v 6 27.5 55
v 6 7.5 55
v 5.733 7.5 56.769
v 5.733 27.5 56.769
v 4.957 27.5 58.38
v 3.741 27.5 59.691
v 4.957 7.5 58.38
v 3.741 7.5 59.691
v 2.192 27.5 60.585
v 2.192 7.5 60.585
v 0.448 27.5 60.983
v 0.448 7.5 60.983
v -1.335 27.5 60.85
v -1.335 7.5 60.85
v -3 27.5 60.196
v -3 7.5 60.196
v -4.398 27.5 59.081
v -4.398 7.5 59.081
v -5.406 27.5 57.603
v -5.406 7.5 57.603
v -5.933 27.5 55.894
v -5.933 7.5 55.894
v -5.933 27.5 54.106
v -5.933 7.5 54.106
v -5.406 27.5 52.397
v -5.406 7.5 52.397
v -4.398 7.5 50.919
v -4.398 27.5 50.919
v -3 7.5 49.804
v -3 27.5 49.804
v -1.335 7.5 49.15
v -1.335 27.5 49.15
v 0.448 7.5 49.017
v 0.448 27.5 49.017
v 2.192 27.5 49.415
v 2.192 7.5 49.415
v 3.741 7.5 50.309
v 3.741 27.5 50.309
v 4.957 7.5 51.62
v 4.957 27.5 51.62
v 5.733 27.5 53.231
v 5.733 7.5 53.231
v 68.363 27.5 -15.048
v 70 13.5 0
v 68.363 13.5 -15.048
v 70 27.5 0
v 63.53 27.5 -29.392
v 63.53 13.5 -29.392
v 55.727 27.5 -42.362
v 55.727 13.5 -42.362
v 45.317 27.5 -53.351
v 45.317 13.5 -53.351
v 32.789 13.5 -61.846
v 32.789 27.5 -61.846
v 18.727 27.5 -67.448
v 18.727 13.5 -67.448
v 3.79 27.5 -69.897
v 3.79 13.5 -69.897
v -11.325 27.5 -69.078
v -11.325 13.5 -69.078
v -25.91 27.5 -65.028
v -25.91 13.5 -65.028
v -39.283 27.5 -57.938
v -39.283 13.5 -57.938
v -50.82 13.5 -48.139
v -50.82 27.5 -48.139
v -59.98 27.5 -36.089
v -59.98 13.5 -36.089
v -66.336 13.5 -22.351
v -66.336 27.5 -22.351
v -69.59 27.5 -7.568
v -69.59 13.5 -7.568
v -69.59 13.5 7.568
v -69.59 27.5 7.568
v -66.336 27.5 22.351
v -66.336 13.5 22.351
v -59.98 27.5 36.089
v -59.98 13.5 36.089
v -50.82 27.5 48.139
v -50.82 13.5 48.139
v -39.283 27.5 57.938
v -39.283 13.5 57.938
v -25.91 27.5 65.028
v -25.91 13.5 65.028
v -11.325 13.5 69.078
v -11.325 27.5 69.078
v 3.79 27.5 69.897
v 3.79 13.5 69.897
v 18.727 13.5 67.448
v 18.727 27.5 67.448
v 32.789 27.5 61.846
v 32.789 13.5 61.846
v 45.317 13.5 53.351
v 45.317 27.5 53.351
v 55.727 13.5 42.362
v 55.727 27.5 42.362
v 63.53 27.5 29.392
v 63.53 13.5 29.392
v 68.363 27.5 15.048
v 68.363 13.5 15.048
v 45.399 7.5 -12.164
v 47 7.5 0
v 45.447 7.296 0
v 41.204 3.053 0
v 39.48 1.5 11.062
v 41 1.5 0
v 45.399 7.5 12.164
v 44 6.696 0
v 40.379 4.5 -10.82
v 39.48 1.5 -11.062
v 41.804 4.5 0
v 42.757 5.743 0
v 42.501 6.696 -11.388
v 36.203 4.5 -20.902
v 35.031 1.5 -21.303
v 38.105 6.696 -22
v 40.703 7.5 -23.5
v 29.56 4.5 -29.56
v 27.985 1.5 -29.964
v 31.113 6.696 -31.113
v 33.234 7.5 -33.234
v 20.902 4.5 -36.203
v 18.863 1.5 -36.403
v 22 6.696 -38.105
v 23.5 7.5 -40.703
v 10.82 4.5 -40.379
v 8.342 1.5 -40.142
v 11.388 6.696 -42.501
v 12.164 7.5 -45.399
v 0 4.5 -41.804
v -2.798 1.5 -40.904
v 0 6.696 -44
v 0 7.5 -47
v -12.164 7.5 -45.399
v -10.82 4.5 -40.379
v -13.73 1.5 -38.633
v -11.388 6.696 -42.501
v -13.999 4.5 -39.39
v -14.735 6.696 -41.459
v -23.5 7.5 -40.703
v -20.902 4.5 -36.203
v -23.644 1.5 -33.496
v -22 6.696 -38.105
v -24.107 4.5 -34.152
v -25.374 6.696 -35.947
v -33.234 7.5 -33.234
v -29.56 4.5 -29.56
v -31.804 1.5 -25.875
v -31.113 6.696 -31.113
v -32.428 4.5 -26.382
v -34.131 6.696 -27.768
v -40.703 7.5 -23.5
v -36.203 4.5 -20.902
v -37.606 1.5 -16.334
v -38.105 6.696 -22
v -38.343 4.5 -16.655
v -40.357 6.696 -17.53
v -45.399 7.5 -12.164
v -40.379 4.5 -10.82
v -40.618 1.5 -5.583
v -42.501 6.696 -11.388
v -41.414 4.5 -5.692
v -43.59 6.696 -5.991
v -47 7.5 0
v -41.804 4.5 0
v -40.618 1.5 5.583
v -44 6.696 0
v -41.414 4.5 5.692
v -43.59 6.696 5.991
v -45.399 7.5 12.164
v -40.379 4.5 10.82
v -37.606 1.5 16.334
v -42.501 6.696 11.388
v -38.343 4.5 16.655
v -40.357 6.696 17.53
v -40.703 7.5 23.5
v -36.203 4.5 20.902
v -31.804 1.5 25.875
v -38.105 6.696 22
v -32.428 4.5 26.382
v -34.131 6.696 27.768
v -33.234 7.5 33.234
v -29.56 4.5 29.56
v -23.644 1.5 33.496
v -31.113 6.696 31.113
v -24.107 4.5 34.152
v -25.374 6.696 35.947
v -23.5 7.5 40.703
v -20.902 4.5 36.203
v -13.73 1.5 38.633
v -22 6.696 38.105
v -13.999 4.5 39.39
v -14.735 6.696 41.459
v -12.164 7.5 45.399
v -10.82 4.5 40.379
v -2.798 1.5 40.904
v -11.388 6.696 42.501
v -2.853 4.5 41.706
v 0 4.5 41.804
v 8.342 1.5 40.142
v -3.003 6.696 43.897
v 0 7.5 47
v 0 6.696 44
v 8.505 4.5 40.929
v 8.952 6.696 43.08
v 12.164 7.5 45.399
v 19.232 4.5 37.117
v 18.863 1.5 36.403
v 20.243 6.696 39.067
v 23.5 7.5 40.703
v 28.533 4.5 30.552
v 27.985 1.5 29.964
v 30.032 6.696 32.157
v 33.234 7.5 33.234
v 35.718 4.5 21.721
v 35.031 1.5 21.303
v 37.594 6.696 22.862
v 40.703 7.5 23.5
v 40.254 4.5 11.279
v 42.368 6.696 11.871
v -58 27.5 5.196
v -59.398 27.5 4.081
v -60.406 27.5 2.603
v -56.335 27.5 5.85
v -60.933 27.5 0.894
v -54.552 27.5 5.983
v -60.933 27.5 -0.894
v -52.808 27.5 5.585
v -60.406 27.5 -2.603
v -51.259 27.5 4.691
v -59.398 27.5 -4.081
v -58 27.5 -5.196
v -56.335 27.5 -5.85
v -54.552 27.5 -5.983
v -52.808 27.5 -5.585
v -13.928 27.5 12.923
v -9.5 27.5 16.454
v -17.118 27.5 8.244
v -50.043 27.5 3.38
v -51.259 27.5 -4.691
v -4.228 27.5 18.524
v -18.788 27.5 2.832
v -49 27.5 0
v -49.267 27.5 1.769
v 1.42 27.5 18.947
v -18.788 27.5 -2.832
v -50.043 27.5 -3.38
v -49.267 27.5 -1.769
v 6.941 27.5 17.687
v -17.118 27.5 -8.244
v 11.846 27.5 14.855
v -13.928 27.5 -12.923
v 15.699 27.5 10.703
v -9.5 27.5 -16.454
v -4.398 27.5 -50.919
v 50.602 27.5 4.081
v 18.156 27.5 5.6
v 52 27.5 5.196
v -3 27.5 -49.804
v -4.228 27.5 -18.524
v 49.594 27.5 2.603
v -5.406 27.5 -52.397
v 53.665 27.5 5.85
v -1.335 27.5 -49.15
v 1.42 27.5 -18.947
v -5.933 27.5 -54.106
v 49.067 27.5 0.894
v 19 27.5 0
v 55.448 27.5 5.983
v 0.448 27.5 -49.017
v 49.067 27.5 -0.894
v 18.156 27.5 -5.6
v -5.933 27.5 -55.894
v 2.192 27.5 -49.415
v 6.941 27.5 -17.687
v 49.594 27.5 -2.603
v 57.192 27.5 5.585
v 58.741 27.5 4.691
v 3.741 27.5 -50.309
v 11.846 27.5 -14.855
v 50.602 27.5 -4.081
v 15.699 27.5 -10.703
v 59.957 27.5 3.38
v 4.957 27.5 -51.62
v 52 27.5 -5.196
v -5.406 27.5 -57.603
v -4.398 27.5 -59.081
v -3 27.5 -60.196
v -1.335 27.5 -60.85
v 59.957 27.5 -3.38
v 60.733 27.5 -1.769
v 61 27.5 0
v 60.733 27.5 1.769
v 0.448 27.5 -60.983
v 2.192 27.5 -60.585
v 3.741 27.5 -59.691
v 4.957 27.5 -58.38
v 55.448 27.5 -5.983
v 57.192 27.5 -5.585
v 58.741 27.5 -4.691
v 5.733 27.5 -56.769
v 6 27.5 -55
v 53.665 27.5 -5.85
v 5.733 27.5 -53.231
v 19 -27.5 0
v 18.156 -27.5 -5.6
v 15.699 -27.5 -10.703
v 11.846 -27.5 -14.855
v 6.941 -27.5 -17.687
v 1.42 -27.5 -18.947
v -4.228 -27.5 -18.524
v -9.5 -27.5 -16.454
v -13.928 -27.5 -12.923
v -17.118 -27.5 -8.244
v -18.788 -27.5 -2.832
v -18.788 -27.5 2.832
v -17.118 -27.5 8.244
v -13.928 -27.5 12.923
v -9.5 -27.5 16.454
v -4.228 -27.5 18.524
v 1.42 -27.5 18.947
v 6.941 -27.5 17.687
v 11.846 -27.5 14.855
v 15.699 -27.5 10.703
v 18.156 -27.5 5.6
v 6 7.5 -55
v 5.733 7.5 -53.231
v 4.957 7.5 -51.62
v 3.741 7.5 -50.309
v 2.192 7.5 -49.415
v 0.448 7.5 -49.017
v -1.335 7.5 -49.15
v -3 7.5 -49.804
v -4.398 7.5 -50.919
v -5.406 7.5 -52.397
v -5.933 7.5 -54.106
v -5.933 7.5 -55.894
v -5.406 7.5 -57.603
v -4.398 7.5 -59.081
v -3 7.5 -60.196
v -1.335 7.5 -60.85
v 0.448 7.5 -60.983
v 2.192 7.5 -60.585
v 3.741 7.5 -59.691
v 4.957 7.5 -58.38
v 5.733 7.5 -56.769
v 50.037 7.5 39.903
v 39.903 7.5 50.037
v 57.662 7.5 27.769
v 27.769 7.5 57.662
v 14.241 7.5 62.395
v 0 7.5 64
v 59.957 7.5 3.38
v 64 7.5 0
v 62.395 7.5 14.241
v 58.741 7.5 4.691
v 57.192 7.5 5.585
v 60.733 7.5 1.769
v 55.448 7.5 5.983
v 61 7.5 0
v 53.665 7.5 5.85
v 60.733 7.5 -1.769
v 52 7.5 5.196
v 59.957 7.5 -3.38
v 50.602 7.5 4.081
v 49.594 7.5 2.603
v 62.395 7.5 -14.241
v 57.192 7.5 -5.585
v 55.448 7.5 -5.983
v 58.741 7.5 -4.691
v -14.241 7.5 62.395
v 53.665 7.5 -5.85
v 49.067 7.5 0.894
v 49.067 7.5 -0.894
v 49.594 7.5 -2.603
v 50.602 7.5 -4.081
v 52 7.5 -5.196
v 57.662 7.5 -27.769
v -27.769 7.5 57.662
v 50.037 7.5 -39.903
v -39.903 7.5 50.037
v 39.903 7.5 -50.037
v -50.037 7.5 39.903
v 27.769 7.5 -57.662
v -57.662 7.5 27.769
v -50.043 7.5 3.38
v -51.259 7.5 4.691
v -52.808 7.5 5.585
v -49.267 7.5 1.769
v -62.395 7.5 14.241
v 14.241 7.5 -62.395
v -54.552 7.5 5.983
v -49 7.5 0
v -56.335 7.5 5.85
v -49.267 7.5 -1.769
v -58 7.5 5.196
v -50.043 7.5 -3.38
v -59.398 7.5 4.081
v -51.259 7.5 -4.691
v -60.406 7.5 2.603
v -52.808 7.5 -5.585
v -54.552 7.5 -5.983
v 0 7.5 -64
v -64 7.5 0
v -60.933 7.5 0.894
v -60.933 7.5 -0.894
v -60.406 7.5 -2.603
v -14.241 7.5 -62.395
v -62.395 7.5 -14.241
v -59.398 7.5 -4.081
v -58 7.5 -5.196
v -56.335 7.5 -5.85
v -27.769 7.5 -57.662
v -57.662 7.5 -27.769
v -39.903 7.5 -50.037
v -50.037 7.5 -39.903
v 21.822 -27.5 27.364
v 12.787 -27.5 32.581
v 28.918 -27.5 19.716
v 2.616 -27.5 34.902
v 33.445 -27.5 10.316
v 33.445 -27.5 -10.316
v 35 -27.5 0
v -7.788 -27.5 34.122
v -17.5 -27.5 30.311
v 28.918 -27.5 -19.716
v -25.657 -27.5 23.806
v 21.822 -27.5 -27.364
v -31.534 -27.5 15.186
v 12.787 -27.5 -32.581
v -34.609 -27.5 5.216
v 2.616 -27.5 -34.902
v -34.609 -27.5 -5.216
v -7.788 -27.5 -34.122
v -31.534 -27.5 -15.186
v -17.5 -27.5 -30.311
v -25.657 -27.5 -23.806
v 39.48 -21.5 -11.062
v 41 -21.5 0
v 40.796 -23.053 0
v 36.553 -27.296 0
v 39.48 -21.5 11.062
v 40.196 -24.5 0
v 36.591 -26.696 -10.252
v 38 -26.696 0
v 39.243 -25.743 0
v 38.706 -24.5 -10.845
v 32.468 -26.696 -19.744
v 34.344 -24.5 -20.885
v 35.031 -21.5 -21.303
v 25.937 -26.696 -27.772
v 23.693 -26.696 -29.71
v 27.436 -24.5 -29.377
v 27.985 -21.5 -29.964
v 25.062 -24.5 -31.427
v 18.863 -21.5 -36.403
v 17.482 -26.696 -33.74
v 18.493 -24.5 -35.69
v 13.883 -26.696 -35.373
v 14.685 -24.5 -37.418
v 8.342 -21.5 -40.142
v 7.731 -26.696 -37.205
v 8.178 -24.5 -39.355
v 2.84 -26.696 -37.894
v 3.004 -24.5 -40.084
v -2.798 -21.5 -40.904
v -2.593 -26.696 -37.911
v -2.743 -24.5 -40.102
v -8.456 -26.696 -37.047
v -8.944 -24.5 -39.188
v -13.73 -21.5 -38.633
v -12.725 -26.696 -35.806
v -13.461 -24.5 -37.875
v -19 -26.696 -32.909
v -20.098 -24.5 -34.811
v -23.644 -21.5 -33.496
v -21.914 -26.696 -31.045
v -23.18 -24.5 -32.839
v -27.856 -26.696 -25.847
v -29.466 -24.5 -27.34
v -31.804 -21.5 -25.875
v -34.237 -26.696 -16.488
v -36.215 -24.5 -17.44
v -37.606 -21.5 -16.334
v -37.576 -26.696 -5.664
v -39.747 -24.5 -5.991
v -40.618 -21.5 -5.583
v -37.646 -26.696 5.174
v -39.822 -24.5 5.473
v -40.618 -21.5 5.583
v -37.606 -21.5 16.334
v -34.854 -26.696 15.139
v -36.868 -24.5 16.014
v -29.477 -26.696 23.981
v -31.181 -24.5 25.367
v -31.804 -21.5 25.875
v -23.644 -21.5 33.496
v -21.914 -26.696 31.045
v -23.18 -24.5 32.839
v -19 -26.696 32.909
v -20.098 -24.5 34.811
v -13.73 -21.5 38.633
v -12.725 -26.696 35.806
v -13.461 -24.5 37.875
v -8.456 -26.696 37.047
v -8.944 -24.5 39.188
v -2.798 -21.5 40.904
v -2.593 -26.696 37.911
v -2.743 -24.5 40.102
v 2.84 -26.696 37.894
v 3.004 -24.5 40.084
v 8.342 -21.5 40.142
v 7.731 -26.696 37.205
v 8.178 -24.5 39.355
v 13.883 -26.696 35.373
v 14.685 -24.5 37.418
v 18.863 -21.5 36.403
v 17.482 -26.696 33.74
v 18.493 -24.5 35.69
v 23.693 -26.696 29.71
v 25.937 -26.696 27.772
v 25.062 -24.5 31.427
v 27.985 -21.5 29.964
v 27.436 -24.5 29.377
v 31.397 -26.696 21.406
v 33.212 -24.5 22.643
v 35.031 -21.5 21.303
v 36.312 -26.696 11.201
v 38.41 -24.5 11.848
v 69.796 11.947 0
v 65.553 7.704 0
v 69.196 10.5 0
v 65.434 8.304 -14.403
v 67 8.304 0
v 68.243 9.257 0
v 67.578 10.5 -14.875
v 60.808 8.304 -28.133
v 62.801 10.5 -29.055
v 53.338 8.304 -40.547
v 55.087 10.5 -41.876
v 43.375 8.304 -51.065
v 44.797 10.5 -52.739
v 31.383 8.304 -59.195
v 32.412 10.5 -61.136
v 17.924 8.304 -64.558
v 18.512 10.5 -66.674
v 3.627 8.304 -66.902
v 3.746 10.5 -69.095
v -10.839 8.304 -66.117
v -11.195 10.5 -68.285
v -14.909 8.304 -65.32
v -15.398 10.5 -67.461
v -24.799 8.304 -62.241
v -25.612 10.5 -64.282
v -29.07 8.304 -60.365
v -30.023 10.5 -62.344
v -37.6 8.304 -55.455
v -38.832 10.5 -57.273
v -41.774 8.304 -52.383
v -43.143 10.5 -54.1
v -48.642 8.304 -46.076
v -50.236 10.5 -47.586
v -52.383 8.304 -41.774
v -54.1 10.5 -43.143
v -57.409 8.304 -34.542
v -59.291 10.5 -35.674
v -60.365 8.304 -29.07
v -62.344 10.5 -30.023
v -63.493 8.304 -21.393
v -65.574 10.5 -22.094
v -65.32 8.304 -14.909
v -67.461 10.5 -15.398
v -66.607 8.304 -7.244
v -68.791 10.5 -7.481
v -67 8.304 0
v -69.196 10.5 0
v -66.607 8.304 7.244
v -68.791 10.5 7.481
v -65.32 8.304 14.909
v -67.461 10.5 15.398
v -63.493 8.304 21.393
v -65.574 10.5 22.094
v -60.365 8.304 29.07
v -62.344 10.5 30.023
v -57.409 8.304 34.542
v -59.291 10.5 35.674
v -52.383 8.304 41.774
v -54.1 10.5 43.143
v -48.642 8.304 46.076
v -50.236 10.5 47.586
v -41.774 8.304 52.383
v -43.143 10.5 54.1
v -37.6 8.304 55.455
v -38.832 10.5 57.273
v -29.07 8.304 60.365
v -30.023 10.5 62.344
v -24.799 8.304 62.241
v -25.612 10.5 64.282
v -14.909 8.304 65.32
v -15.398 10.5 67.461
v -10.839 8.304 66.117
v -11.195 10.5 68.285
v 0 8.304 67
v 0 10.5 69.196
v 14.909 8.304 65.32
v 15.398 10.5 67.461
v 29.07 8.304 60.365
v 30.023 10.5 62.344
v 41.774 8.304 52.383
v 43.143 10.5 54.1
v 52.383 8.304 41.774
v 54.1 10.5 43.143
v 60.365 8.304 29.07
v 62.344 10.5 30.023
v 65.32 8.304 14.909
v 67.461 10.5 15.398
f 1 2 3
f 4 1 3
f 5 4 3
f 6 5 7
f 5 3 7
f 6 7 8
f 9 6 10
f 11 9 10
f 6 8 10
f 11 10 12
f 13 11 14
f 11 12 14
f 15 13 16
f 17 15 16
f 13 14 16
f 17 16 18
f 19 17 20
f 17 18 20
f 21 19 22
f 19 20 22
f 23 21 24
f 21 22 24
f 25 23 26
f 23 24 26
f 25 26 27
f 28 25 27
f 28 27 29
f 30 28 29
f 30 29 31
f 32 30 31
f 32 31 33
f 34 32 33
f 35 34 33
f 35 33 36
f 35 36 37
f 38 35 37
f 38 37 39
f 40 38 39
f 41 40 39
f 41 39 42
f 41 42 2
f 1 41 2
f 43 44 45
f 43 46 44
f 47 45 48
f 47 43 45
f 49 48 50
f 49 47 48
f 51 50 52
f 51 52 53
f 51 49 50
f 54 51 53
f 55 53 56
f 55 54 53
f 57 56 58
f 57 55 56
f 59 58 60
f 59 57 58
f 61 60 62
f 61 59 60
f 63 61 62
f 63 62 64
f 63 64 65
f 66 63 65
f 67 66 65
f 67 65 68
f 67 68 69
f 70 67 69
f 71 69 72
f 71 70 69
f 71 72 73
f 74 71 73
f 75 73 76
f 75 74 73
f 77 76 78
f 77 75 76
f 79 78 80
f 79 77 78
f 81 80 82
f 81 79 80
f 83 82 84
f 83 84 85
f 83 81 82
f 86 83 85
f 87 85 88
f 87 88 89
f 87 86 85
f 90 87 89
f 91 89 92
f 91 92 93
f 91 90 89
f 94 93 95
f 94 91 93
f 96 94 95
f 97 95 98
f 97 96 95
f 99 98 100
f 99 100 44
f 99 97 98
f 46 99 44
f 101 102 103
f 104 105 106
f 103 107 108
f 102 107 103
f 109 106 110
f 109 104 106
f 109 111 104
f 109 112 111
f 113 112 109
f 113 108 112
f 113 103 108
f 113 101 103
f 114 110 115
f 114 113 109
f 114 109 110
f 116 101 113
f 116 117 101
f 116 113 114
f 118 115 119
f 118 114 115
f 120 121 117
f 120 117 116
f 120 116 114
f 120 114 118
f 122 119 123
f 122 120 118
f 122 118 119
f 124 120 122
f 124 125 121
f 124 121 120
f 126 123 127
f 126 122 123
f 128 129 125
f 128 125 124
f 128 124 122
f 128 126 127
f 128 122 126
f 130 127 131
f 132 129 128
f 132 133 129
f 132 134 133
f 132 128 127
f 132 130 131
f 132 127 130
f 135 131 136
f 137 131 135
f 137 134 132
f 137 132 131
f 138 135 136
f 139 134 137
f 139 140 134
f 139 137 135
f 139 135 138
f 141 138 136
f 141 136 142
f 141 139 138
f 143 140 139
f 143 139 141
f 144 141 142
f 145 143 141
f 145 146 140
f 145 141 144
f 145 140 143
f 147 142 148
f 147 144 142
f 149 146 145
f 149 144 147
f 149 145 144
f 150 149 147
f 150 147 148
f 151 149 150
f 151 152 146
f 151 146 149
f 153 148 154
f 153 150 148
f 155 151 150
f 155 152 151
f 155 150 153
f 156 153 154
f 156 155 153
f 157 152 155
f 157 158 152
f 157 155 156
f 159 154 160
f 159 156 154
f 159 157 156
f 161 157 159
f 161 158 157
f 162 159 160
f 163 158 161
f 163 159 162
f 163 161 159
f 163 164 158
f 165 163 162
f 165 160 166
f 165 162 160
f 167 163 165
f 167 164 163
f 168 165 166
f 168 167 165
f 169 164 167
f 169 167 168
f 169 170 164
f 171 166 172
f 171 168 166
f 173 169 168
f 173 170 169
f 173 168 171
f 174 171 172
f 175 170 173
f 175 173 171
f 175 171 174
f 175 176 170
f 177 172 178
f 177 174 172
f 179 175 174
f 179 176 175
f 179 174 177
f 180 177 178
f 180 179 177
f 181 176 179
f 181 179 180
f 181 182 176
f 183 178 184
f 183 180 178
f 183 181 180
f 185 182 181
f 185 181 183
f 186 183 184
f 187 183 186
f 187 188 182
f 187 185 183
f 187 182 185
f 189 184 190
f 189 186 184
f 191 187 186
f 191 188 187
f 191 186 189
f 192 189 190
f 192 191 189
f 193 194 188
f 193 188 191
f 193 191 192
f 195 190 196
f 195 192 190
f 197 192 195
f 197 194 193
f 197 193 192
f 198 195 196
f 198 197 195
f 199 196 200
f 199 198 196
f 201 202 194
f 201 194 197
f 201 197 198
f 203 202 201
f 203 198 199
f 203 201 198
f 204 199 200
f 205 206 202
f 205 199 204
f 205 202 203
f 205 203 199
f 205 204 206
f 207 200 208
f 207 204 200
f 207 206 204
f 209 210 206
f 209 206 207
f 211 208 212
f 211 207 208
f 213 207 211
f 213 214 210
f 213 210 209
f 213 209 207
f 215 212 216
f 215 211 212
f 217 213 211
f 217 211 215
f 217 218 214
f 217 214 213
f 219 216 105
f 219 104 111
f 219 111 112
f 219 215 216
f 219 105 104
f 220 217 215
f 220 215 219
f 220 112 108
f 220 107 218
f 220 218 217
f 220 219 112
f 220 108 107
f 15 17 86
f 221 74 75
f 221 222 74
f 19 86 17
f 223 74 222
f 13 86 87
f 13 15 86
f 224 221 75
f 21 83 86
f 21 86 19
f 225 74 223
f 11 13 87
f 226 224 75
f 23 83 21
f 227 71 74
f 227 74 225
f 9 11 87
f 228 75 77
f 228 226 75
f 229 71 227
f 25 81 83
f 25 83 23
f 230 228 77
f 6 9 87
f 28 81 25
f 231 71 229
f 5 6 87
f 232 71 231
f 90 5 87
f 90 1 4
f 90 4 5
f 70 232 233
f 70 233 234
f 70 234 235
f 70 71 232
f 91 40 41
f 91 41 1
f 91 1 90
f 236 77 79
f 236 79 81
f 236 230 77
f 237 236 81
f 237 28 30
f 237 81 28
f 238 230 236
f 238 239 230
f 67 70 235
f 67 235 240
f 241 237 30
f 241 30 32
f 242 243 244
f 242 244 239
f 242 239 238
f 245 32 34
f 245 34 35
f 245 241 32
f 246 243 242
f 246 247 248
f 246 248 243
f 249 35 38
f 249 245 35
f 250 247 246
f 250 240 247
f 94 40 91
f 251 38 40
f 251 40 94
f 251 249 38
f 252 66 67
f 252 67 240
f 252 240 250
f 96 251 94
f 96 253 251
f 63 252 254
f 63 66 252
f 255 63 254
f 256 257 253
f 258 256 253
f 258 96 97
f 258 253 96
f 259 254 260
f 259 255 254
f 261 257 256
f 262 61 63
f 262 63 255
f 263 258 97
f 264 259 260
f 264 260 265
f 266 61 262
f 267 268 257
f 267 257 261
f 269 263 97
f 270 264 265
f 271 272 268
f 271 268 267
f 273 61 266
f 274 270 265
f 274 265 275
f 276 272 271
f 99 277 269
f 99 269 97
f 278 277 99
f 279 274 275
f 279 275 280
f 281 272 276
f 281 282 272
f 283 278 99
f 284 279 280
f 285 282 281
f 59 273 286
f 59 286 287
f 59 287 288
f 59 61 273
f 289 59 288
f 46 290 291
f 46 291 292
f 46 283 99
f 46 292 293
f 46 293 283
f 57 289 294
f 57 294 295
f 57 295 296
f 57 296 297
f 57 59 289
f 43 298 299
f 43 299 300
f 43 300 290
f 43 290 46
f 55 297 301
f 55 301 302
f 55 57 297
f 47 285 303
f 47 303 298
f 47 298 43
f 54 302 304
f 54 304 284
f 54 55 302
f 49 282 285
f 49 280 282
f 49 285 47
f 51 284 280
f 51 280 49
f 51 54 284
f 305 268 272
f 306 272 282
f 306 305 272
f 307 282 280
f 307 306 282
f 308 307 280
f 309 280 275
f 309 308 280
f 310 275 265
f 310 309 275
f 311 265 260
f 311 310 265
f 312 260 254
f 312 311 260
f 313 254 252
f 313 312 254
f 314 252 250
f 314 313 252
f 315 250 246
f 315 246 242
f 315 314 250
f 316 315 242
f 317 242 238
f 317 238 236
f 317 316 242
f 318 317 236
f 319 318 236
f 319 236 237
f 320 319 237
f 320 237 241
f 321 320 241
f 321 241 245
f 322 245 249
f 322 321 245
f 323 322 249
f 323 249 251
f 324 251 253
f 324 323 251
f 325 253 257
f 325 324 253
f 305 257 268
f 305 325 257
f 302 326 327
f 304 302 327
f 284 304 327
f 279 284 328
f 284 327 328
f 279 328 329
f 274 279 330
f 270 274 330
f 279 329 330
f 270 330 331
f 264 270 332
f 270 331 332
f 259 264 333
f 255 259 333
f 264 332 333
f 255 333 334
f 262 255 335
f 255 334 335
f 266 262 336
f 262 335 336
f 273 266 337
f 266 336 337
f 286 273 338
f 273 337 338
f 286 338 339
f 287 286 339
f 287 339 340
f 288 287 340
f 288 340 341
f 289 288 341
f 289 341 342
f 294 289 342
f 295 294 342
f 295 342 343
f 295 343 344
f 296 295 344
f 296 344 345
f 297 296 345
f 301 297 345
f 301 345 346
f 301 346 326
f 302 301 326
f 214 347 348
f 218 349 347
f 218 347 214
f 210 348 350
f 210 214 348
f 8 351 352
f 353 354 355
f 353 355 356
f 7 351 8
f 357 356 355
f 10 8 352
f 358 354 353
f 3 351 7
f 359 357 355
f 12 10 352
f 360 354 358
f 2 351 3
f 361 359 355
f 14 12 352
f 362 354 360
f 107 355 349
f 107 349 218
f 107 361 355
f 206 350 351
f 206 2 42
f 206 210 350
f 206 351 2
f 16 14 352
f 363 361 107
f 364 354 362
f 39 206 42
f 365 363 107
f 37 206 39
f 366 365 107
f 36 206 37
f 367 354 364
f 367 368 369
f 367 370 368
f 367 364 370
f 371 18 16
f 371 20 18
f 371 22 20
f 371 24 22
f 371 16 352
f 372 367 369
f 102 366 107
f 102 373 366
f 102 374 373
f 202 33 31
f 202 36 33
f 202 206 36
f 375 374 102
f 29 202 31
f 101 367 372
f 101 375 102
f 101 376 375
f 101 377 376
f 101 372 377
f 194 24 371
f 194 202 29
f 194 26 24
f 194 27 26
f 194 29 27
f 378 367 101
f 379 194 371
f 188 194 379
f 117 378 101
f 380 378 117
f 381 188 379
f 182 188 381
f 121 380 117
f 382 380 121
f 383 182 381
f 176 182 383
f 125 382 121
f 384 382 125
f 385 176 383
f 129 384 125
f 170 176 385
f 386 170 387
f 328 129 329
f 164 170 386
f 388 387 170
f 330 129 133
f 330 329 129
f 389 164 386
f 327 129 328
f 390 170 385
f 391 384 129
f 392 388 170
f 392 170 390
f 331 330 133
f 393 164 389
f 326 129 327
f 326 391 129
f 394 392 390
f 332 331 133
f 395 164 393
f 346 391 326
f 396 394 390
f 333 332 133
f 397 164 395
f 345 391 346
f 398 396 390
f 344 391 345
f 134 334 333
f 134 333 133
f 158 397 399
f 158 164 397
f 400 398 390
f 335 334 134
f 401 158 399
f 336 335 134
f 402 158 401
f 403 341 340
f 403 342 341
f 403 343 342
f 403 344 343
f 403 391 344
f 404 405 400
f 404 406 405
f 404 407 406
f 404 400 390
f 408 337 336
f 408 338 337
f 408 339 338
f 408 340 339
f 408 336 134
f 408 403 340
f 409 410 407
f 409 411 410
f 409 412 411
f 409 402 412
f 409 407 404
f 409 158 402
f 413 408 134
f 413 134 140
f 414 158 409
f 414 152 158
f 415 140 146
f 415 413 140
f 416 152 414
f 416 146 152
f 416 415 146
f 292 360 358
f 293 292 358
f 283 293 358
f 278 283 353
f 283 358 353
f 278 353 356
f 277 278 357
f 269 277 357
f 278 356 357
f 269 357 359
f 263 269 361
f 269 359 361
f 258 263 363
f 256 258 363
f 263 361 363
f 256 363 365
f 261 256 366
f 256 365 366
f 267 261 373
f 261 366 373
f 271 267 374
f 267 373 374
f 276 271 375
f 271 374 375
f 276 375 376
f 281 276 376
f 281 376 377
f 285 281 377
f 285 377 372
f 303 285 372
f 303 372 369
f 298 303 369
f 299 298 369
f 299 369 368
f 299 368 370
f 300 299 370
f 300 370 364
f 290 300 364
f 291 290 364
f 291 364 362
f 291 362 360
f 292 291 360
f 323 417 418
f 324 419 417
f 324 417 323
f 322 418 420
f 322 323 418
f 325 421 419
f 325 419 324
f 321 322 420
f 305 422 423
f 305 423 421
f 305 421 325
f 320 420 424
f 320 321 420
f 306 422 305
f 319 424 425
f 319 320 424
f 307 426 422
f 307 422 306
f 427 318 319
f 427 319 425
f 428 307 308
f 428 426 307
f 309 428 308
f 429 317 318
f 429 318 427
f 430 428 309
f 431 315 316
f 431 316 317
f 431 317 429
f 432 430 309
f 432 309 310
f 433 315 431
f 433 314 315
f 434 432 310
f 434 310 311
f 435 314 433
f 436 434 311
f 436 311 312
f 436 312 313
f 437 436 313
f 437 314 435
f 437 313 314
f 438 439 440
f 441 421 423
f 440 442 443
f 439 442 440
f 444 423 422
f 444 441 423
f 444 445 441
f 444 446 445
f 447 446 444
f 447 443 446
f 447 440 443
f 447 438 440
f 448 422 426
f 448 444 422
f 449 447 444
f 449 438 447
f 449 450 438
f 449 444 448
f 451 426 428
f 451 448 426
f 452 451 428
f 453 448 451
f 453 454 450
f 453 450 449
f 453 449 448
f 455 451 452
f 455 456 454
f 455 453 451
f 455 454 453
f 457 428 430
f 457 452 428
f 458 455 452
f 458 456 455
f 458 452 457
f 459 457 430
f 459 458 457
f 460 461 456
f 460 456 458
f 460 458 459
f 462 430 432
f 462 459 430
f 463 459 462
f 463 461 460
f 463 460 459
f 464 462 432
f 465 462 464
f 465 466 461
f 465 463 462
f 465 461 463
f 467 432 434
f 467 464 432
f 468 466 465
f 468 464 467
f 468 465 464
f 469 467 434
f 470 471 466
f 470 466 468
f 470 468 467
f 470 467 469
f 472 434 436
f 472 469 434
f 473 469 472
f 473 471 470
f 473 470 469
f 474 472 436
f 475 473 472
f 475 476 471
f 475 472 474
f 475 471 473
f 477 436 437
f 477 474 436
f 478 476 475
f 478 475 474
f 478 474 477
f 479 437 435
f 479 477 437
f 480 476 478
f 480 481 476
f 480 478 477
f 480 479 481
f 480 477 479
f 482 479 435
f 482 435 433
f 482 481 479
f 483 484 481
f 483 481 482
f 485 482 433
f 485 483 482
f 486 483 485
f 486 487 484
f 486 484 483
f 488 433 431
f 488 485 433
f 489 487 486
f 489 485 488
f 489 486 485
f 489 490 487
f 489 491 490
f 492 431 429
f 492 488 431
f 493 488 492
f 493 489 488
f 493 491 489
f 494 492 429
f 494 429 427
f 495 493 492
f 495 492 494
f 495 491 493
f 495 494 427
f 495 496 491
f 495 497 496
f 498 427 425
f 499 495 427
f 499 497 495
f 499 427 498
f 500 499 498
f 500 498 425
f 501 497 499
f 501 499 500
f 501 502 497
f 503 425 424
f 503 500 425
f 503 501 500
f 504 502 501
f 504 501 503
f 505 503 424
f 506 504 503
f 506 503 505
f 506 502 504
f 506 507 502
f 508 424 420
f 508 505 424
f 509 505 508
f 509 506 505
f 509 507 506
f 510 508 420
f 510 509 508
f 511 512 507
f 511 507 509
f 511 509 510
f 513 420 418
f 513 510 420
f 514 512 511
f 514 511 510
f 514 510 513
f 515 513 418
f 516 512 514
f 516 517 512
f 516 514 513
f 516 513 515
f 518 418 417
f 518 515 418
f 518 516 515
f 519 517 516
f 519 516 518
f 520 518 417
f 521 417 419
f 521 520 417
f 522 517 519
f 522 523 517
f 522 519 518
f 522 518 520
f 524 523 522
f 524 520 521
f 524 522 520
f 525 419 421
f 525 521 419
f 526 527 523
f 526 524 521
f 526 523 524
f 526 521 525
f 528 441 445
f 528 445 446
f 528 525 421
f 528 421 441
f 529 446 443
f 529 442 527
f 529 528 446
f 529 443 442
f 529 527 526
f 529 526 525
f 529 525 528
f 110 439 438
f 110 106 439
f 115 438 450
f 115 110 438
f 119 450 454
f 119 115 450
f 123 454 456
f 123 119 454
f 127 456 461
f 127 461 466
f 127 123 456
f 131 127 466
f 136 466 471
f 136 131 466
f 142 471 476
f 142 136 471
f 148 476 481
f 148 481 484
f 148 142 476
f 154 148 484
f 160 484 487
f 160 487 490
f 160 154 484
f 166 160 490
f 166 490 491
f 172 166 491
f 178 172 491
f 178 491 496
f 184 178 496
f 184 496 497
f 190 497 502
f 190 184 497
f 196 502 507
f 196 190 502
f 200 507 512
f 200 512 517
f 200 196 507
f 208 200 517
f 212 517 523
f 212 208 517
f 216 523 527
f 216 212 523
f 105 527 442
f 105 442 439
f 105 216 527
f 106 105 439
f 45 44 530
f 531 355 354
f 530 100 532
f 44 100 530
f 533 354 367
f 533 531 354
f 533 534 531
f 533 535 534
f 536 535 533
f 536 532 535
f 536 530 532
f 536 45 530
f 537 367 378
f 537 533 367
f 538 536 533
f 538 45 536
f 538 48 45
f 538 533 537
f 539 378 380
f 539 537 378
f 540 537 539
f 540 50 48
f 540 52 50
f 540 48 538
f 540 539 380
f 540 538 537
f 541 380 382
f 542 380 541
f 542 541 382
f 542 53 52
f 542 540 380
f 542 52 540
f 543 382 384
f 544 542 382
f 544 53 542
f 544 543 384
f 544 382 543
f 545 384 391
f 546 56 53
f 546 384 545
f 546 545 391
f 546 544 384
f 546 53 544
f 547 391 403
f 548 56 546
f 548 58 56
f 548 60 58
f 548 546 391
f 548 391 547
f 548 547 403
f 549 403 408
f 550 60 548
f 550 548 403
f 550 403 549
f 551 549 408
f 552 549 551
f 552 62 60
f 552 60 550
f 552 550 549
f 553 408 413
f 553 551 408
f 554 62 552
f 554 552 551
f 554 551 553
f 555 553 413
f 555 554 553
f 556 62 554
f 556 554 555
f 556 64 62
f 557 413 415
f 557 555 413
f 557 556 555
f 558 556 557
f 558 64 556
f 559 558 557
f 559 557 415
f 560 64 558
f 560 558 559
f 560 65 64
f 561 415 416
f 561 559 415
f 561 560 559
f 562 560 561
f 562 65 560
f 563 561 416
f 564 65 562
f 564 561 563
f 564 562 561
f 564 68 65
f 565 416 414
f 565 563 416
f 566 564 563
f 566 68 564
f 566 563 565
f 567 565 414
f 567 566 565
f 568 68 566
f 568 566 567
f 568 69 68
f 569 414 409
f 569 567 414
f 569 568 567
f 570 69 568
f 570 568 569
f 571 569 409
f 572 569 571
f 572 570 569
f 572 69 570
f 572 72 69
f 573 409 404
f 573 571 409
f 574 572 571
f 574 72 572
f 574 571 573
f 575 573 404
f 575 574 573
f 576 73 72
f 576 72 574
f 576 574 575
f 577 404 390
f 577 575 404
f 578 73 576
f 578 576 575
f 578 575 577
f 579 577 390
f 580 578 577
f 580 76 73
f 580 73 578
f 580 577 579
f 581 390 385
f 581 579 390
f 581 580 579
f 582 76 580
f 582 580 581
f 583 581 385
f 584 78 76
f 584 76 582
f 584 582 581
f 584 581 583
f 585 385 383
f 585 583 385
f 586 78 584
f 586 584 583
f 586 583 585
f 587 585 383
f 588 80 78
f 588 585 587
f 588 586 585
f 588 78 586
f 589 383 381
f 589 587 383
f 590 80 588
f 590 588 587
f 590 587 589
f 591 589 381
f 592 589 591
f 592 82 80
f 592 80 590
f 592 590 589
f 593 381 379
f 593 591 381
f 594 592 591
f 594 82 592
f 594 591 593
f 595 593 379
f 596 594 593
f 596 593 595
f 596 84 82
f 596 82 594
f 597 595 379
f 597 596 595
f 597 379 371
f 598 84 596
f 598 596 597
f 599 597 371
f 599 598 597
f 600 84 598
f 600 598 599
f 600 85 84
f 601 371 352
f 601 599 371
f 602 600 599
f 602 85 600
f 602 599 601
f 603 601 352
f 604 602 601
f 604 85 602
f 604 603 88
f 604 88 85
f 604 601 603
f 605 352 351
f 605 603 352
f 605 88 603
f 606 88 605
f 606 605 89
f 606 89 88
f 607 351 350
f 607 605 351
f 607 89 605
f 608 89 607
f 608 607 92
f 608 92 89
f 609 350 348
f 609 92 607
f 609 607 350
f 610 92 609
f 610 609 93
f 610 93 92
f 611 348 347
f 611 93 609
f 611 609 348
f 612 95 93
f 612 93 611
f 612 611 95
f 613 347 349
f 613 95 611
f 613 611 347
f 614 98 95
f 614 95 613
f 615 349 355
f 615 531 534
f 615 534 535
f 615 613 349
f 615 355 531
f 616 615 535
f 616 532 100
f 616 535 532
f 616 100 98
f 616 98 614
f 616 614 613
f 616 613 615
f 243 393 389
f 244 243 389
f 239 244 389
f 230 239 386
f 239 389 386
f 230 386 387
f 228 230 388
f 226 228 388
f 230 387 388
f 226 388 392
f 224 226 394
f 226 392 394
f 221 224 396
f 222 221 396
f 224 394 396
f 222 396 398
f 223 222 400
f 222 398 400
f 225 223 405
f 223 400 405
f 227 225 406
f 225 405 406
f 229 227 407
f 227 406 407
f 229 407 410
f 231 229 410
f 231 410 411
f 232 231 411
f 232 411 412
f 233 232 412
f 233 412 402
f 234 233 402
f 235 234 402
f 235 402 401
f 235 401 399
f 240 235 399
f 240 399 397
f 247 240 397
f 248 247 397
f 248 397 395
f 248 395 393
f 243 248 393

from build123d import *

# Parameters (mm, degrees)
SKETCH2_R          = 6
CUT_EXTRUDE1_DEPTH = 106.000000067


with BuildPart() as part:
    # Sketch1 → Revolve1 (revolve)
    with BuildSketch(Plane.XY):
        with BuildLine():
            Line((70, 27.5), (19, 27.5))
            Line((19, 27.5), (19, -27.5))
            Line((19, -27.5), (35, -27.5))
            ThreePointArc((35, -27.5), (39.242640687, -25.742640687), (41, -21.5))
            Line((41, -21.5), (41, 1.5))
            ThreePointArc((41, 1.5), (42.757359313, 5.742640687), (47, 7.5))
            Line((47, 7.5), (64, 7.5))
            ThreePointArc((64, 7.5), (68.242640687, 9.257359313), (70, 13.5))
            Line((70, 13.5), (70, 27.5))
        make_face()
    revolve(axis=Axis((0, -27.5, 0), (0, 1, 0)))

    # Sketch2 → Cut-Extrude1 (cut, through all)
    with BuildSketch(Plane.XZ.offset(-7.5)):
        with Locations((-55, 0)):
            Circle(SKETCH2_R)
        with Locations((0, 55)):
            Circle(SKETCH2_R)
        with Locations((55, 0)):
            Circle(SKETCH2_R)
        with Locations((0, -55)):
            Circle(SKETCH2_R)
    extrude(amount=-CUT_EXTRUDE1_DEPTH, mode=Mode.SUBTRACT)


solid = part.part
